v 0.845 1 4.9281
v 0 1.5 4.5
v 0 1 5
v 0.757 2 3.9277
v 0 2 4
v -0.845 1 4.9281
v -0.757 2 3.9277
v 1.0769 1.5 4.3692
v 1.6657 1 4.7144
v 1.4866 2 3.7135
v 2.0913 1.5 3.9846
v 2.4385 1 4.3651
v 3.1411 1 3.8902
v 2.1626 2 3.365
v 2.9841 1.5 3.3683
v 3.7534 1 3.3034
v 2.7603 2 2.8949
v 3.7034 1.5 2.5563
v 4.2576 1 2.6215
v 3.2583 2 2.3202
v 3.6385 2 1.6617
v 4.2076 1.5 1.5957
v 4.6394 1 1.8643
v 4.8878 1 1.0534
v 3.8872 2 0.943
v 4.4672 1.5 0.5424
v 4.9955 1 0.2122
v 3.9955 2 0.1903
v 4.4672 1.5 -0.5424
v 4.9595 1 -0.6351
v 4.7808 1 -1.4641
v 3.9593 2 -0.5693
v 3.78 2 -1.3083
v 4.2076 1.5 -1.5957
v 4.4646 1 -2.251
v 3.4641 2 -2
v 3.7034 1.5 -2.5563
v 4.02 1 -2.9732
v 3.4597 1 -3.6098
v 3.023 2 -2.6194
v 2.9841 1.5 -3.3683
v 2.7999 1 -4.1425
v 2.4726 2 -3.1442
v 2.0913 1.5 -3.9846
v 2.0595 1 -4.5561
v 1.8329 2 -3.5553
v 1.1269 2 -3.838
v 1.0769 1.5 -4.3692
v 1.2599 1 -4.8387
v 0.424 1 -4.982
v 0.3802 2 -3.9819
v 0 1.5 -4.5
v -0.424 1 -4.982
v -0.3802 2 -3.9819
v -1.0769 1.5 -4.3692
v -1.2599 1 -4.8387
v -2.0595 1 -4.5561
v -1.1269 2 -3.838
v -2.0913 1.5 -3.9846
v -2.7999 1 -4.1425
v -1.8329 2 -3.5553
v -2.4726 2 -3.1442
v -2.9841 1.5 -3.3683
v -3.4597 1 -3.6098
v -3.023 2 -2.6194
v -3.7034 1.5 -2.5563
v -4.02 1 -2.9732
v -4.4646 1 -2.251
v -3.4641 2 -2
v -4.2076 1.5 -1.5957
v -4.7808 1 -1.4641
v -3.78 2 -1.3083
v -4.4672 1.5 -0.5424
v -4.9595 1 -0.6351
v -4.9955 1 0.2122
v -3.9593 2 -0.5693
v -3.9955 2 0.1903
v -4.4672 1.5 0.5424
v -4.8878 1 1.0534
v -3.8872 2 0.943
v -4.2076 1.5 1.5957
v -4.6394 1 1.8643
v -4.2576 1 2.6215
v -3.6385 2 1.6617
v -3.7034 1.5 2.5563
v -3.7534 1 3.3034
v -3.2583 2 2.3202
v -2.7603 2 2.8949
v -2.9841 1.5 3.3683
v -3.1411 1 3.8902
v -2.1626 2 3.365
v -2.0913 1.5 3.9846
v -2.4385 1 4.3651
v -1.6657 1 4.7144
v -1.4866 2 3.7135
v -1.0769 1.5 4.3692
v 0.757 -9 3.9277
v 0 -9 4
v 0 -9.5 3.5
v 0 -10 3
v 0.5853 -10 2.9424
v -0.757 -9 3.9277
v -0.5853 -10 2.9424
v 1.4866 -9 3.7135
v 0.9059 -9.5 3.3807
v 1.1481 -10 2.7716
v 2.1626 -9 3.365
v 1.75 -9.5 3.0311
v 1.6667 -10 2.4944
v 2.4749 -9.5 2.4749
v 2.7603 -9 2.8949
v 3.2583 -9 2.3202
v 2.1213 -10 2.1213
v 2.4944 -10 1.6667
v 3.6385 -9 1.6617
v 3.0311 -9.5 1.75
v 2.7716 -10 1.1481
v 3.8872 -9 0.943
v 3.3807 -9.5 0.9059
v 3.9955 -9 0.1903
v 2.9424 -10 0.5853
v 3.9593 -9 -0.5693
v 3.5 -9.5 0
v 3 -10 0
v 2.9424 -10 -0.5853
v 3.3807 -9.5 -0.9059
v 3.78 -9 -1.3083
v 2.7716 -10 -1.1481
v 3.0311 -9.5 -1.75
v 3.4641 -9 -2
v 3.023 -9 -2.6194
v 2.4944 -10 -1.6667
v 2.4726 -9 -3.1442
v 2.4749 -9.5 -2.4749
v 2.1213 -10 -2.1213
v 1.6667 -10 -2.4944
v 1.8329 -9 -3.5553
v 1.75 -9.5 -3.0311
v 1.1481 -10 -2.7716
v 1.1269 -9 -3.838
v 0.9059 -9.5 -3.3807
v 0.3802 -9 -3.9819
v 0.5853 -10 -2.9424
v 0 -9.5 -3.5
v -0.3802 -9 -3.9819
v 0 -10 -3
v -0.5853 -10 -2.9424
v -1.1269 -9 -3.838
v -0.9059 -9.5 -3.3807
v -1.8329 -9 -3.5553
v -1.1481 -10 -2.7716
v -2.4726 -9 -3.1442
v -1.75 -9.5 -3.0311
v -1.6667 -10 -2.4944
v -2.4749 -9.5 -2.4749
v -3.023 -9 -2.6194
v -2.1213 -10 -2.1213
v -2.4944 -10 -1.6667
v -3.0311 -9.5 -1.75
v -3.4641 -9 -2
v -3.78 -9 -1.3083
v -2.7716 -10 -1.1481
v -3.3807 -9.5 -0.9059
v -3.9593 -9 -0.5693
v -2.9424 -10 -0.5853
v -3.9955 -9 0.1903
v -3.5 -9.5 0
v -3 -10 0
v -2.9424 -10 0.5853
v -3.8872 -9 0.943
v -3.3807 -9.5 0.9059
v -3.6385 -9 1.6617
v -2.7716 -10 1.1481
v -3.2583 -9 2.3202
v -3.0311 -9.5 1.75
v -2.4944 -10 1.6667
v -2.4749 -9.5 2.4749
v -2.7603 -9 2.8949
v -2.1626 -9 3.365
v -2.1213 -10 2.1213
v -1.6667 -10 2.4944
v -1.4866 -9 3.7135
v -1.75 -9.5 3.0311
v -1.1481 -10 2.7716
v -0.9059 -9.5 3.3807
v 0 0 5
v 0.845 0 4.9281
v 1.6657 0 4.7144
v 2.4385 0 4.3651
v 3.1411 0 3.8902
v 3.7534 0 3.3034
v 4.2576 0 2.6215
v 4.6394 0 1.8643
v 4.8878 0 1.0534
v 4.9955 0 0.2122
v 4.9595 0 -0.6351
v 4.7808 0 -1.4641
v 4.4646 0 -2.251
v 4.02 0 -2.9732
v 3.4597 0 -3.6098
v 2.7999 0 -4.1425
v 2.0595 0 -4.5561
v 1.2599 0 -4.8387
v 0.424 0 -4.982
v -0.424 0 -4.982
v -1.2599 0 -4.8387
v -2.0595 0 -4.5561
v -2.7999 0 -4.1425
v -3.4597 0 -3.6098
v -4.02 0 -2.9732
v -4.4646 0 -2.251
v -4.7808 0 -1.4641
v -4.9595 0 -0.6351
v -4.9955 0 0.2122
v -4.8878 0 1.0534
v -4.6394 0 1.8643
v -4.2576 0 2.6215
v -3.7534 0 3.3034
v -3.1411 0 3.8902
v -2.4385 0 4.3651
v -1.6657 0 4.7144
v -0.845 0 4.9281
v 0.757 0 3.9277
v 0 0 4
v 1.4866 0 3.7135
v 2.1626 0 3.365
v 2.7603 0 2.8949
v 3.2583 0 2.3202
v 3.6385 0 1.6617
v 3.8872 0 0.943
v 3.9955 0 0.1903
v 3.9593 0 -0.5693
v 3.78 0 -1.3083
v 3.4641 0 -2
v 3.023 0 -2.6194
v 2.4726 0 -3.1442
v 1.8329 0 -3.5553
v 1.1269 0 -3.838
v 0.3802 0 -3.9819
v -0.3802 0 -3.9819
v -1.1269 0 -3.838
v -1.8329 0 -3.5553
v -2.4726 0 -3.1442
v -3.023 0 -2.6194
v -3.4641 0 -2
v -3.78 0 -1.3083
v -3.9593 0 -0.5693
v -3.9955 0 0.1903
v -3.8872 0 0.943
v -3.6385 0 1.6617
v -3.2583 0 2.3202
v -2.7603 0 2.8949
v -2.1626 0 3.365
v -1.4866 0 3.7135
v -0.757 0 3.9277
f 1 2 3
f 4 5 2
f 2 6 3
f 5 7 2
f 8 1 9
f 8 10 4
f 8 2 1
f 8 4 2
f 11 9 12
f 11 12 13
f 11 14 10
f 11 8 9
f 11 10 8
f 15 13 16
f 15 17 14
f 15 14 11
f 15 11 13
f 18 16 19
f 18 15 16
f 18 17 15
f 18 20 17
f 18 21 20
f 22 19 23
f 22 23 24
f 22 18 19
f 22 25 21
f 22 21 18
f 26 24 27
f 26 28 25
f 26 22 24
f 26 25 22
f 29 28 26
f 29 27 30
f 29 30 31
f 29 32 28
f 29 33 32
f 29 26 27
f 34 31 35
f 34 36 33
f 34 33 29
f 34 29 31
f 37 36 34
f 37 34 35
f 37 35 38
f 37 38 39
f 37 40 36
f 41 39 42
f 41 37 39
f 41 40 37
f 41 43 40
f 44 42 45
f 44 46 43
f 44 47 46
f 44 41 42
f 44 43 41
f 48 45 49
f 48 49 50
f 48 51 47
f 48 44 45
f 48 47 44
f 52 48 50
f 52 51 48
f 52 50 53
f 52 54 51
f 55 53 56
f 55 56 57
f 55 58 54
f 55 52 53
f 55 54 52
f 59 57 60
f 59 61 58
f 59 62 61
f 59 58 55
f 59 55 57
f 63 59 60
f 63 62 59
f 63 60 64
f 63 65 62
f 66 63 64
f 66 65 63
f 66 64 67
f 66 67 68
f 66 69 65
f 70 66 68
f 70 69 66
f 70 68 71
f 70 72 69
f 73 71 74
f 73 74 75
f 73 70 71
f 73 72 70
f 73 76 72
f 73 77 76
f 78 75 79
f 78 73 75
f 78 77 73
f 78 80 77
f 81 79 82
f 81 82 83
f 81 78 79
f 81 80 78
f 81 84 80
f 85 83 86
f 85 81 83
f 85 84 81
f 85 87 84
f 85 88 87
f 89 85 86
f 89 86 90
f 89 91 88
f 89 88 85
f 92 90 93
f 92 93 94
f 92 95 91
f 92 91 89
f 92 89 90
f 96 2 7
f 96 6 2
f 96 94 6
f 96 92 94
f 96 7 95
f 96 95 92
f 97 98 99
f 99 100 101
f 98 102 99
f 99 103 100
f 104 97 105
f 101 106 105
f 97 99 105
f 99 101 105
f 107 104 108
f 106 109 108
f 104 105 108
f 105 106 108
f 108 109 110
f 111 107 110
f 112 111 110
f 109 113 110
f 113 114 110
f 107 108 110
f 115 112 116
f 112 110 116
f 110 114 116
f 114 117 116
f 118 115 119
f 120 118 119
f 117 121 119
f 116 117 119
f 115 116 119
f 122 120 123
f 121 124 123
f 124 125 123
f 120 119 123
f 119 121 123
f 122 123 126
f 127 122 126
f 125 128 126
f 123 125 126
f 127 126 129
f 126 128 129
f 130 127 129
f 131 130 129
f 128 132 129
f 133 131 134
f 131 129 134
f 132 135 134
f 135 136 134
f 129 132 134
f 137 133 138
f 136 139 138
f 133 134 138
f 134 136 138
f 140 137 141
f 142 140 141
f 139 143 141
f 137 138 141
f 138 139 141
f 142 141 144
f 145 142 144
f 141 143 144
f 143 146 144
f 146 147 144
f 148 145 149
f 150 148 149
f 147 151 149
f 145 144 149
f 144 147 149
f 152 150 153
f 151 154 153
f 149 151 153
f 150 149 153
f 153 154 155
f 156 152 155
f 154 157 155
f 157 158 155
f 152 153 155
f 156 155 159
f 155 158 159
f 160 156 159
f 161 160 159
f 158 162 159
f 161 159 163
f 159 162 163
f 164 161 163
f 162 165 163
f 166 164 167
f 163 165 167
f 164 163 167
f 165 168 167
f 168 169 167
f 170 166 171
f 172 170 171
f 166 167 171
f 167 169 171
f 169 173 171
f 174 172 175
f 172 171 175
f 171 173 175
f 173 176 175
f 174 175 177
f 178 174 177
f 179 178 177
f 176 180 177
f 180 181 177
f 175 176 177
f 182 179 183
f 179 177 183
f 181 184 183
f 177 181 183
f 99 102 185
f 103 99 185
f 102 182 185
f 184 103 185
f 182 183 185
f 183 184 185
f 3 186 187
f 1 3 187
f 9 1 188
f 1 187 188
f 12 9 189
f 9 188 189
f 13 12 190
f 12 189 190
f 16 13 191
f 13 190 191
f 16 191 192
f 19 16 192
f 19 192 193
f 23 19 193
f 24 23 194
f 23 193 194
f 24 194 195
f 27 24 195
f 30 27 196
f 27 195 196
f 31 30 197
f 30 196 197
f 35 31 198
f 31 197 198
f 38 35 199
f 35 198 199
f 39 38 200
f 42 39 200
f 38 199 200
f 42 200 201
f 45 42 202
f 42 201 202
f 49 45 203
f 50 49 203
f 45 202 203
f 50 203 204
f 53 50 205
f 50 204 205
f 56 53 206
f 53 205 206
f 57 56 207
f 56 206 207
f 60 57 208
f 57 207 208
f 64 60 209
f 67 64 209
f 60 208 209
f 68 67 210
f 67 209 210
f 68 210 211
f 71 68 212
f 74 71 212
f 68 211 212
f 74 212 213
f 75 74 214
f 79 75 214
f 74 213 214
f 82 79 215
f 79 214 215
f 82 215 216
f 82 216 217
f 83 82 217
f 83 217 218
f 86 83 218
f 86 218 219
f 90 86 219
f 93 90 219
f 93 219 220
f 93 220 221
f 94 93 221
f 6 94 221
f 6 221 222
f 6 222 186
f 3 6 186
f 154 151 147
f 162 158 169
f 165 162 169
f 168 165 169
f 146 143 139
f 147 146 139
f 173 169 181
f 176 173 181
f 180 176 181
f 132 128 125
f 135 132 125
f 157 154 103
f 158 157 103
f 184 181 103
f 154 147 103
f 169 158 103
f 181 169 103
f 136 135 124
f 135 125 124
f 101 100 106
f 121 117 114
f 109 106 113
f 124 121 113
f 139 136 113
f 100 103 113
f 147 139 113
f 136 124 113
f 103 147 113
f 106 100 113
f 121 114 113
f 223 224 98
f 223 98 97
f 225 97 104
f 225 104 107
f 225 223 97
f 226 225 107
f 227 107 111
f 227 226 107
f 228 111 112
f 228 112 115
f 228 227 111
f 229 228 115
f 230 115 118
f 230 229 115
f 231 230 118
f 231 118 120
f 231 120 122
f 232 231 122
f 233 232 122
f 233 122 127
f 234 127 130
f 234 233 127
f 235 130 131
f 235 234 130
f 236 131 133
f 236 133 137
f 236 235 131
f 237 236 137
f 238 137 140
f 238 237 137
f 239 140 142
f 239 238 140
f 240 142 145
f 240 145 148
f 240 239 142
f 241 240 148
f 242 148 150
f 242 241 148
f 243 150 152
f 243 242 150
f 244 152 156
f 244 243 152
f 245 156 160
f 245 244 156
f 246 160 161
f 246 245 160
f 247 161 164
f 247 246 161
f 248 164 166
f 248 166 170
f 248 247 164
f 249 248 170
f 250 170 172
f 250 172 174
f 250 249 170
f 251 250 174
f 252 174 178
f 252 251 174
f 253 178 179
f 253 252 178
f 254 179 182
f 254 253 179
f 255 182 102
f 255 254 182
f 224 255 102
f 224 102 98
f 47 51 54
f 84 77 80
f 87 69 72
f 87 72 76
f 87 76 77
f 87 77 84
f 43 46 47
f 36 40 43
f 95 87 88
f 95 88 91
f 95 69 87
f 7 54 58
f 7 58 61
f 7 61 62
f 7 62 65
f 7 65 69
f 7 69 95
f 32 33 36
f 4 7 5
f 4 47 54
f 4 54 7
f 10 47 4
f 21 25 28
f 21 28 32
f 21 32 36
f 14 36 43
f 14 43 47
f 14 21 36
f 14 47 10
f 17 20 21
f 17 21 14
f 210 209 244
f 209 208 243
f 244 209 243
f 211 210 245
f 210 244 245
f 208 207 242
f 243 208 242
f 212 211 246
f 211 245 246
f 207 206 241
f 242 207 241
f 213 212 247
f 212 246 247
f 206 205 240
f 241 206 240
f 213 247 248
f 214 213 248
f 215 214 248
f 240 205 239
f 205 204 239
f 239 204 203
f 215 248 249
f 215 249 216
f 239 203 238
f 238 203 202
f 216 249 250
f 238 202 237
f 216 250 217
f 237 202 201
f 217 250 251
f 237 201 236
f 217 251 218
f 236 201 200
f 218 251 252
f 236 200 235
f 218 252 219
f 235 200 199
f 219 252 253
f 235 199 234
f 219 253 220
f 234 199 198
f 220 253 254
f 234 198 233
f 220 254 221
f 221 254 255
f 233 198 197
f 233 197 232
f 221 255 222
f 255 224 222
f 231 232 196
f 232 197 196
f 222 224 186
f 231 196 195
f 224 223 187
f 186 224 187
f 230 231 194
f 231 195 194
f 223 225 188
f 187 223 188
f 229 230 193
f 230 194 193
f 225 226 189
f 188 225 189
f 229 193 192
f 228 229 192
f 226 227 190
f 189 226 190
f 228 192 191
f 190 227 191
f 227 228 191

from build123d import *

# Parameters (mm, degrees)
ESBO_O1_R       = 4
EXTRUS_O1_DEPTH = 10
ESBO_O2_R       = 5
EXTRUS_O2_DEPTH = 2
CHANFRO1_SIZE   = 1
CHANFRO2_SIZE   = 1


with BuildPart() as part:
    # Esboço1 → Extrusão1 (new body)
    with BuildSketch(Plane(origin=(0, 0, 0), x_dir=(1, 0, 0), z_dir=(0, 1, 0))):
        with Locations(Location((0, 0, 0), (0, 0, 270))):  # turned: the seam where the file's is
            Circle(ESBO_O1_R)
    extrude(amount=-EXTRUS_O1_DEPTH)

    # Esboço2 → Extrusão2 (add)
    with BuildSketch(Plane(origin=(0, 0, 0), x_dir=(1, 0, 0), z_dir=(0, 1, 0))):
        with Locations(Location((0, 0, 0), (0, 0, 270))):  # turned: the seam where the file's is
            Circle(ESBO_O2_R)
    extrude(amount=EXTRUS_O2_DEPTH)

    # Chanfro1
    chanfro1_edges = [part.edges().sort_by_distance(p)[0] for p in [
        (0, -10, -4),
    ]]
    chamfer(chanfro1_edges, length=CHANFRO1_SIZE)

    # Chanfro2
    chanfro2_edges = [part.edges().sort_by_distance(p)[0] for p in [
        (0, 2, -5),
    ]]
    chamfer(chanfro2_edges, length=CHANFRO2_SIZE)


solid = part.part
